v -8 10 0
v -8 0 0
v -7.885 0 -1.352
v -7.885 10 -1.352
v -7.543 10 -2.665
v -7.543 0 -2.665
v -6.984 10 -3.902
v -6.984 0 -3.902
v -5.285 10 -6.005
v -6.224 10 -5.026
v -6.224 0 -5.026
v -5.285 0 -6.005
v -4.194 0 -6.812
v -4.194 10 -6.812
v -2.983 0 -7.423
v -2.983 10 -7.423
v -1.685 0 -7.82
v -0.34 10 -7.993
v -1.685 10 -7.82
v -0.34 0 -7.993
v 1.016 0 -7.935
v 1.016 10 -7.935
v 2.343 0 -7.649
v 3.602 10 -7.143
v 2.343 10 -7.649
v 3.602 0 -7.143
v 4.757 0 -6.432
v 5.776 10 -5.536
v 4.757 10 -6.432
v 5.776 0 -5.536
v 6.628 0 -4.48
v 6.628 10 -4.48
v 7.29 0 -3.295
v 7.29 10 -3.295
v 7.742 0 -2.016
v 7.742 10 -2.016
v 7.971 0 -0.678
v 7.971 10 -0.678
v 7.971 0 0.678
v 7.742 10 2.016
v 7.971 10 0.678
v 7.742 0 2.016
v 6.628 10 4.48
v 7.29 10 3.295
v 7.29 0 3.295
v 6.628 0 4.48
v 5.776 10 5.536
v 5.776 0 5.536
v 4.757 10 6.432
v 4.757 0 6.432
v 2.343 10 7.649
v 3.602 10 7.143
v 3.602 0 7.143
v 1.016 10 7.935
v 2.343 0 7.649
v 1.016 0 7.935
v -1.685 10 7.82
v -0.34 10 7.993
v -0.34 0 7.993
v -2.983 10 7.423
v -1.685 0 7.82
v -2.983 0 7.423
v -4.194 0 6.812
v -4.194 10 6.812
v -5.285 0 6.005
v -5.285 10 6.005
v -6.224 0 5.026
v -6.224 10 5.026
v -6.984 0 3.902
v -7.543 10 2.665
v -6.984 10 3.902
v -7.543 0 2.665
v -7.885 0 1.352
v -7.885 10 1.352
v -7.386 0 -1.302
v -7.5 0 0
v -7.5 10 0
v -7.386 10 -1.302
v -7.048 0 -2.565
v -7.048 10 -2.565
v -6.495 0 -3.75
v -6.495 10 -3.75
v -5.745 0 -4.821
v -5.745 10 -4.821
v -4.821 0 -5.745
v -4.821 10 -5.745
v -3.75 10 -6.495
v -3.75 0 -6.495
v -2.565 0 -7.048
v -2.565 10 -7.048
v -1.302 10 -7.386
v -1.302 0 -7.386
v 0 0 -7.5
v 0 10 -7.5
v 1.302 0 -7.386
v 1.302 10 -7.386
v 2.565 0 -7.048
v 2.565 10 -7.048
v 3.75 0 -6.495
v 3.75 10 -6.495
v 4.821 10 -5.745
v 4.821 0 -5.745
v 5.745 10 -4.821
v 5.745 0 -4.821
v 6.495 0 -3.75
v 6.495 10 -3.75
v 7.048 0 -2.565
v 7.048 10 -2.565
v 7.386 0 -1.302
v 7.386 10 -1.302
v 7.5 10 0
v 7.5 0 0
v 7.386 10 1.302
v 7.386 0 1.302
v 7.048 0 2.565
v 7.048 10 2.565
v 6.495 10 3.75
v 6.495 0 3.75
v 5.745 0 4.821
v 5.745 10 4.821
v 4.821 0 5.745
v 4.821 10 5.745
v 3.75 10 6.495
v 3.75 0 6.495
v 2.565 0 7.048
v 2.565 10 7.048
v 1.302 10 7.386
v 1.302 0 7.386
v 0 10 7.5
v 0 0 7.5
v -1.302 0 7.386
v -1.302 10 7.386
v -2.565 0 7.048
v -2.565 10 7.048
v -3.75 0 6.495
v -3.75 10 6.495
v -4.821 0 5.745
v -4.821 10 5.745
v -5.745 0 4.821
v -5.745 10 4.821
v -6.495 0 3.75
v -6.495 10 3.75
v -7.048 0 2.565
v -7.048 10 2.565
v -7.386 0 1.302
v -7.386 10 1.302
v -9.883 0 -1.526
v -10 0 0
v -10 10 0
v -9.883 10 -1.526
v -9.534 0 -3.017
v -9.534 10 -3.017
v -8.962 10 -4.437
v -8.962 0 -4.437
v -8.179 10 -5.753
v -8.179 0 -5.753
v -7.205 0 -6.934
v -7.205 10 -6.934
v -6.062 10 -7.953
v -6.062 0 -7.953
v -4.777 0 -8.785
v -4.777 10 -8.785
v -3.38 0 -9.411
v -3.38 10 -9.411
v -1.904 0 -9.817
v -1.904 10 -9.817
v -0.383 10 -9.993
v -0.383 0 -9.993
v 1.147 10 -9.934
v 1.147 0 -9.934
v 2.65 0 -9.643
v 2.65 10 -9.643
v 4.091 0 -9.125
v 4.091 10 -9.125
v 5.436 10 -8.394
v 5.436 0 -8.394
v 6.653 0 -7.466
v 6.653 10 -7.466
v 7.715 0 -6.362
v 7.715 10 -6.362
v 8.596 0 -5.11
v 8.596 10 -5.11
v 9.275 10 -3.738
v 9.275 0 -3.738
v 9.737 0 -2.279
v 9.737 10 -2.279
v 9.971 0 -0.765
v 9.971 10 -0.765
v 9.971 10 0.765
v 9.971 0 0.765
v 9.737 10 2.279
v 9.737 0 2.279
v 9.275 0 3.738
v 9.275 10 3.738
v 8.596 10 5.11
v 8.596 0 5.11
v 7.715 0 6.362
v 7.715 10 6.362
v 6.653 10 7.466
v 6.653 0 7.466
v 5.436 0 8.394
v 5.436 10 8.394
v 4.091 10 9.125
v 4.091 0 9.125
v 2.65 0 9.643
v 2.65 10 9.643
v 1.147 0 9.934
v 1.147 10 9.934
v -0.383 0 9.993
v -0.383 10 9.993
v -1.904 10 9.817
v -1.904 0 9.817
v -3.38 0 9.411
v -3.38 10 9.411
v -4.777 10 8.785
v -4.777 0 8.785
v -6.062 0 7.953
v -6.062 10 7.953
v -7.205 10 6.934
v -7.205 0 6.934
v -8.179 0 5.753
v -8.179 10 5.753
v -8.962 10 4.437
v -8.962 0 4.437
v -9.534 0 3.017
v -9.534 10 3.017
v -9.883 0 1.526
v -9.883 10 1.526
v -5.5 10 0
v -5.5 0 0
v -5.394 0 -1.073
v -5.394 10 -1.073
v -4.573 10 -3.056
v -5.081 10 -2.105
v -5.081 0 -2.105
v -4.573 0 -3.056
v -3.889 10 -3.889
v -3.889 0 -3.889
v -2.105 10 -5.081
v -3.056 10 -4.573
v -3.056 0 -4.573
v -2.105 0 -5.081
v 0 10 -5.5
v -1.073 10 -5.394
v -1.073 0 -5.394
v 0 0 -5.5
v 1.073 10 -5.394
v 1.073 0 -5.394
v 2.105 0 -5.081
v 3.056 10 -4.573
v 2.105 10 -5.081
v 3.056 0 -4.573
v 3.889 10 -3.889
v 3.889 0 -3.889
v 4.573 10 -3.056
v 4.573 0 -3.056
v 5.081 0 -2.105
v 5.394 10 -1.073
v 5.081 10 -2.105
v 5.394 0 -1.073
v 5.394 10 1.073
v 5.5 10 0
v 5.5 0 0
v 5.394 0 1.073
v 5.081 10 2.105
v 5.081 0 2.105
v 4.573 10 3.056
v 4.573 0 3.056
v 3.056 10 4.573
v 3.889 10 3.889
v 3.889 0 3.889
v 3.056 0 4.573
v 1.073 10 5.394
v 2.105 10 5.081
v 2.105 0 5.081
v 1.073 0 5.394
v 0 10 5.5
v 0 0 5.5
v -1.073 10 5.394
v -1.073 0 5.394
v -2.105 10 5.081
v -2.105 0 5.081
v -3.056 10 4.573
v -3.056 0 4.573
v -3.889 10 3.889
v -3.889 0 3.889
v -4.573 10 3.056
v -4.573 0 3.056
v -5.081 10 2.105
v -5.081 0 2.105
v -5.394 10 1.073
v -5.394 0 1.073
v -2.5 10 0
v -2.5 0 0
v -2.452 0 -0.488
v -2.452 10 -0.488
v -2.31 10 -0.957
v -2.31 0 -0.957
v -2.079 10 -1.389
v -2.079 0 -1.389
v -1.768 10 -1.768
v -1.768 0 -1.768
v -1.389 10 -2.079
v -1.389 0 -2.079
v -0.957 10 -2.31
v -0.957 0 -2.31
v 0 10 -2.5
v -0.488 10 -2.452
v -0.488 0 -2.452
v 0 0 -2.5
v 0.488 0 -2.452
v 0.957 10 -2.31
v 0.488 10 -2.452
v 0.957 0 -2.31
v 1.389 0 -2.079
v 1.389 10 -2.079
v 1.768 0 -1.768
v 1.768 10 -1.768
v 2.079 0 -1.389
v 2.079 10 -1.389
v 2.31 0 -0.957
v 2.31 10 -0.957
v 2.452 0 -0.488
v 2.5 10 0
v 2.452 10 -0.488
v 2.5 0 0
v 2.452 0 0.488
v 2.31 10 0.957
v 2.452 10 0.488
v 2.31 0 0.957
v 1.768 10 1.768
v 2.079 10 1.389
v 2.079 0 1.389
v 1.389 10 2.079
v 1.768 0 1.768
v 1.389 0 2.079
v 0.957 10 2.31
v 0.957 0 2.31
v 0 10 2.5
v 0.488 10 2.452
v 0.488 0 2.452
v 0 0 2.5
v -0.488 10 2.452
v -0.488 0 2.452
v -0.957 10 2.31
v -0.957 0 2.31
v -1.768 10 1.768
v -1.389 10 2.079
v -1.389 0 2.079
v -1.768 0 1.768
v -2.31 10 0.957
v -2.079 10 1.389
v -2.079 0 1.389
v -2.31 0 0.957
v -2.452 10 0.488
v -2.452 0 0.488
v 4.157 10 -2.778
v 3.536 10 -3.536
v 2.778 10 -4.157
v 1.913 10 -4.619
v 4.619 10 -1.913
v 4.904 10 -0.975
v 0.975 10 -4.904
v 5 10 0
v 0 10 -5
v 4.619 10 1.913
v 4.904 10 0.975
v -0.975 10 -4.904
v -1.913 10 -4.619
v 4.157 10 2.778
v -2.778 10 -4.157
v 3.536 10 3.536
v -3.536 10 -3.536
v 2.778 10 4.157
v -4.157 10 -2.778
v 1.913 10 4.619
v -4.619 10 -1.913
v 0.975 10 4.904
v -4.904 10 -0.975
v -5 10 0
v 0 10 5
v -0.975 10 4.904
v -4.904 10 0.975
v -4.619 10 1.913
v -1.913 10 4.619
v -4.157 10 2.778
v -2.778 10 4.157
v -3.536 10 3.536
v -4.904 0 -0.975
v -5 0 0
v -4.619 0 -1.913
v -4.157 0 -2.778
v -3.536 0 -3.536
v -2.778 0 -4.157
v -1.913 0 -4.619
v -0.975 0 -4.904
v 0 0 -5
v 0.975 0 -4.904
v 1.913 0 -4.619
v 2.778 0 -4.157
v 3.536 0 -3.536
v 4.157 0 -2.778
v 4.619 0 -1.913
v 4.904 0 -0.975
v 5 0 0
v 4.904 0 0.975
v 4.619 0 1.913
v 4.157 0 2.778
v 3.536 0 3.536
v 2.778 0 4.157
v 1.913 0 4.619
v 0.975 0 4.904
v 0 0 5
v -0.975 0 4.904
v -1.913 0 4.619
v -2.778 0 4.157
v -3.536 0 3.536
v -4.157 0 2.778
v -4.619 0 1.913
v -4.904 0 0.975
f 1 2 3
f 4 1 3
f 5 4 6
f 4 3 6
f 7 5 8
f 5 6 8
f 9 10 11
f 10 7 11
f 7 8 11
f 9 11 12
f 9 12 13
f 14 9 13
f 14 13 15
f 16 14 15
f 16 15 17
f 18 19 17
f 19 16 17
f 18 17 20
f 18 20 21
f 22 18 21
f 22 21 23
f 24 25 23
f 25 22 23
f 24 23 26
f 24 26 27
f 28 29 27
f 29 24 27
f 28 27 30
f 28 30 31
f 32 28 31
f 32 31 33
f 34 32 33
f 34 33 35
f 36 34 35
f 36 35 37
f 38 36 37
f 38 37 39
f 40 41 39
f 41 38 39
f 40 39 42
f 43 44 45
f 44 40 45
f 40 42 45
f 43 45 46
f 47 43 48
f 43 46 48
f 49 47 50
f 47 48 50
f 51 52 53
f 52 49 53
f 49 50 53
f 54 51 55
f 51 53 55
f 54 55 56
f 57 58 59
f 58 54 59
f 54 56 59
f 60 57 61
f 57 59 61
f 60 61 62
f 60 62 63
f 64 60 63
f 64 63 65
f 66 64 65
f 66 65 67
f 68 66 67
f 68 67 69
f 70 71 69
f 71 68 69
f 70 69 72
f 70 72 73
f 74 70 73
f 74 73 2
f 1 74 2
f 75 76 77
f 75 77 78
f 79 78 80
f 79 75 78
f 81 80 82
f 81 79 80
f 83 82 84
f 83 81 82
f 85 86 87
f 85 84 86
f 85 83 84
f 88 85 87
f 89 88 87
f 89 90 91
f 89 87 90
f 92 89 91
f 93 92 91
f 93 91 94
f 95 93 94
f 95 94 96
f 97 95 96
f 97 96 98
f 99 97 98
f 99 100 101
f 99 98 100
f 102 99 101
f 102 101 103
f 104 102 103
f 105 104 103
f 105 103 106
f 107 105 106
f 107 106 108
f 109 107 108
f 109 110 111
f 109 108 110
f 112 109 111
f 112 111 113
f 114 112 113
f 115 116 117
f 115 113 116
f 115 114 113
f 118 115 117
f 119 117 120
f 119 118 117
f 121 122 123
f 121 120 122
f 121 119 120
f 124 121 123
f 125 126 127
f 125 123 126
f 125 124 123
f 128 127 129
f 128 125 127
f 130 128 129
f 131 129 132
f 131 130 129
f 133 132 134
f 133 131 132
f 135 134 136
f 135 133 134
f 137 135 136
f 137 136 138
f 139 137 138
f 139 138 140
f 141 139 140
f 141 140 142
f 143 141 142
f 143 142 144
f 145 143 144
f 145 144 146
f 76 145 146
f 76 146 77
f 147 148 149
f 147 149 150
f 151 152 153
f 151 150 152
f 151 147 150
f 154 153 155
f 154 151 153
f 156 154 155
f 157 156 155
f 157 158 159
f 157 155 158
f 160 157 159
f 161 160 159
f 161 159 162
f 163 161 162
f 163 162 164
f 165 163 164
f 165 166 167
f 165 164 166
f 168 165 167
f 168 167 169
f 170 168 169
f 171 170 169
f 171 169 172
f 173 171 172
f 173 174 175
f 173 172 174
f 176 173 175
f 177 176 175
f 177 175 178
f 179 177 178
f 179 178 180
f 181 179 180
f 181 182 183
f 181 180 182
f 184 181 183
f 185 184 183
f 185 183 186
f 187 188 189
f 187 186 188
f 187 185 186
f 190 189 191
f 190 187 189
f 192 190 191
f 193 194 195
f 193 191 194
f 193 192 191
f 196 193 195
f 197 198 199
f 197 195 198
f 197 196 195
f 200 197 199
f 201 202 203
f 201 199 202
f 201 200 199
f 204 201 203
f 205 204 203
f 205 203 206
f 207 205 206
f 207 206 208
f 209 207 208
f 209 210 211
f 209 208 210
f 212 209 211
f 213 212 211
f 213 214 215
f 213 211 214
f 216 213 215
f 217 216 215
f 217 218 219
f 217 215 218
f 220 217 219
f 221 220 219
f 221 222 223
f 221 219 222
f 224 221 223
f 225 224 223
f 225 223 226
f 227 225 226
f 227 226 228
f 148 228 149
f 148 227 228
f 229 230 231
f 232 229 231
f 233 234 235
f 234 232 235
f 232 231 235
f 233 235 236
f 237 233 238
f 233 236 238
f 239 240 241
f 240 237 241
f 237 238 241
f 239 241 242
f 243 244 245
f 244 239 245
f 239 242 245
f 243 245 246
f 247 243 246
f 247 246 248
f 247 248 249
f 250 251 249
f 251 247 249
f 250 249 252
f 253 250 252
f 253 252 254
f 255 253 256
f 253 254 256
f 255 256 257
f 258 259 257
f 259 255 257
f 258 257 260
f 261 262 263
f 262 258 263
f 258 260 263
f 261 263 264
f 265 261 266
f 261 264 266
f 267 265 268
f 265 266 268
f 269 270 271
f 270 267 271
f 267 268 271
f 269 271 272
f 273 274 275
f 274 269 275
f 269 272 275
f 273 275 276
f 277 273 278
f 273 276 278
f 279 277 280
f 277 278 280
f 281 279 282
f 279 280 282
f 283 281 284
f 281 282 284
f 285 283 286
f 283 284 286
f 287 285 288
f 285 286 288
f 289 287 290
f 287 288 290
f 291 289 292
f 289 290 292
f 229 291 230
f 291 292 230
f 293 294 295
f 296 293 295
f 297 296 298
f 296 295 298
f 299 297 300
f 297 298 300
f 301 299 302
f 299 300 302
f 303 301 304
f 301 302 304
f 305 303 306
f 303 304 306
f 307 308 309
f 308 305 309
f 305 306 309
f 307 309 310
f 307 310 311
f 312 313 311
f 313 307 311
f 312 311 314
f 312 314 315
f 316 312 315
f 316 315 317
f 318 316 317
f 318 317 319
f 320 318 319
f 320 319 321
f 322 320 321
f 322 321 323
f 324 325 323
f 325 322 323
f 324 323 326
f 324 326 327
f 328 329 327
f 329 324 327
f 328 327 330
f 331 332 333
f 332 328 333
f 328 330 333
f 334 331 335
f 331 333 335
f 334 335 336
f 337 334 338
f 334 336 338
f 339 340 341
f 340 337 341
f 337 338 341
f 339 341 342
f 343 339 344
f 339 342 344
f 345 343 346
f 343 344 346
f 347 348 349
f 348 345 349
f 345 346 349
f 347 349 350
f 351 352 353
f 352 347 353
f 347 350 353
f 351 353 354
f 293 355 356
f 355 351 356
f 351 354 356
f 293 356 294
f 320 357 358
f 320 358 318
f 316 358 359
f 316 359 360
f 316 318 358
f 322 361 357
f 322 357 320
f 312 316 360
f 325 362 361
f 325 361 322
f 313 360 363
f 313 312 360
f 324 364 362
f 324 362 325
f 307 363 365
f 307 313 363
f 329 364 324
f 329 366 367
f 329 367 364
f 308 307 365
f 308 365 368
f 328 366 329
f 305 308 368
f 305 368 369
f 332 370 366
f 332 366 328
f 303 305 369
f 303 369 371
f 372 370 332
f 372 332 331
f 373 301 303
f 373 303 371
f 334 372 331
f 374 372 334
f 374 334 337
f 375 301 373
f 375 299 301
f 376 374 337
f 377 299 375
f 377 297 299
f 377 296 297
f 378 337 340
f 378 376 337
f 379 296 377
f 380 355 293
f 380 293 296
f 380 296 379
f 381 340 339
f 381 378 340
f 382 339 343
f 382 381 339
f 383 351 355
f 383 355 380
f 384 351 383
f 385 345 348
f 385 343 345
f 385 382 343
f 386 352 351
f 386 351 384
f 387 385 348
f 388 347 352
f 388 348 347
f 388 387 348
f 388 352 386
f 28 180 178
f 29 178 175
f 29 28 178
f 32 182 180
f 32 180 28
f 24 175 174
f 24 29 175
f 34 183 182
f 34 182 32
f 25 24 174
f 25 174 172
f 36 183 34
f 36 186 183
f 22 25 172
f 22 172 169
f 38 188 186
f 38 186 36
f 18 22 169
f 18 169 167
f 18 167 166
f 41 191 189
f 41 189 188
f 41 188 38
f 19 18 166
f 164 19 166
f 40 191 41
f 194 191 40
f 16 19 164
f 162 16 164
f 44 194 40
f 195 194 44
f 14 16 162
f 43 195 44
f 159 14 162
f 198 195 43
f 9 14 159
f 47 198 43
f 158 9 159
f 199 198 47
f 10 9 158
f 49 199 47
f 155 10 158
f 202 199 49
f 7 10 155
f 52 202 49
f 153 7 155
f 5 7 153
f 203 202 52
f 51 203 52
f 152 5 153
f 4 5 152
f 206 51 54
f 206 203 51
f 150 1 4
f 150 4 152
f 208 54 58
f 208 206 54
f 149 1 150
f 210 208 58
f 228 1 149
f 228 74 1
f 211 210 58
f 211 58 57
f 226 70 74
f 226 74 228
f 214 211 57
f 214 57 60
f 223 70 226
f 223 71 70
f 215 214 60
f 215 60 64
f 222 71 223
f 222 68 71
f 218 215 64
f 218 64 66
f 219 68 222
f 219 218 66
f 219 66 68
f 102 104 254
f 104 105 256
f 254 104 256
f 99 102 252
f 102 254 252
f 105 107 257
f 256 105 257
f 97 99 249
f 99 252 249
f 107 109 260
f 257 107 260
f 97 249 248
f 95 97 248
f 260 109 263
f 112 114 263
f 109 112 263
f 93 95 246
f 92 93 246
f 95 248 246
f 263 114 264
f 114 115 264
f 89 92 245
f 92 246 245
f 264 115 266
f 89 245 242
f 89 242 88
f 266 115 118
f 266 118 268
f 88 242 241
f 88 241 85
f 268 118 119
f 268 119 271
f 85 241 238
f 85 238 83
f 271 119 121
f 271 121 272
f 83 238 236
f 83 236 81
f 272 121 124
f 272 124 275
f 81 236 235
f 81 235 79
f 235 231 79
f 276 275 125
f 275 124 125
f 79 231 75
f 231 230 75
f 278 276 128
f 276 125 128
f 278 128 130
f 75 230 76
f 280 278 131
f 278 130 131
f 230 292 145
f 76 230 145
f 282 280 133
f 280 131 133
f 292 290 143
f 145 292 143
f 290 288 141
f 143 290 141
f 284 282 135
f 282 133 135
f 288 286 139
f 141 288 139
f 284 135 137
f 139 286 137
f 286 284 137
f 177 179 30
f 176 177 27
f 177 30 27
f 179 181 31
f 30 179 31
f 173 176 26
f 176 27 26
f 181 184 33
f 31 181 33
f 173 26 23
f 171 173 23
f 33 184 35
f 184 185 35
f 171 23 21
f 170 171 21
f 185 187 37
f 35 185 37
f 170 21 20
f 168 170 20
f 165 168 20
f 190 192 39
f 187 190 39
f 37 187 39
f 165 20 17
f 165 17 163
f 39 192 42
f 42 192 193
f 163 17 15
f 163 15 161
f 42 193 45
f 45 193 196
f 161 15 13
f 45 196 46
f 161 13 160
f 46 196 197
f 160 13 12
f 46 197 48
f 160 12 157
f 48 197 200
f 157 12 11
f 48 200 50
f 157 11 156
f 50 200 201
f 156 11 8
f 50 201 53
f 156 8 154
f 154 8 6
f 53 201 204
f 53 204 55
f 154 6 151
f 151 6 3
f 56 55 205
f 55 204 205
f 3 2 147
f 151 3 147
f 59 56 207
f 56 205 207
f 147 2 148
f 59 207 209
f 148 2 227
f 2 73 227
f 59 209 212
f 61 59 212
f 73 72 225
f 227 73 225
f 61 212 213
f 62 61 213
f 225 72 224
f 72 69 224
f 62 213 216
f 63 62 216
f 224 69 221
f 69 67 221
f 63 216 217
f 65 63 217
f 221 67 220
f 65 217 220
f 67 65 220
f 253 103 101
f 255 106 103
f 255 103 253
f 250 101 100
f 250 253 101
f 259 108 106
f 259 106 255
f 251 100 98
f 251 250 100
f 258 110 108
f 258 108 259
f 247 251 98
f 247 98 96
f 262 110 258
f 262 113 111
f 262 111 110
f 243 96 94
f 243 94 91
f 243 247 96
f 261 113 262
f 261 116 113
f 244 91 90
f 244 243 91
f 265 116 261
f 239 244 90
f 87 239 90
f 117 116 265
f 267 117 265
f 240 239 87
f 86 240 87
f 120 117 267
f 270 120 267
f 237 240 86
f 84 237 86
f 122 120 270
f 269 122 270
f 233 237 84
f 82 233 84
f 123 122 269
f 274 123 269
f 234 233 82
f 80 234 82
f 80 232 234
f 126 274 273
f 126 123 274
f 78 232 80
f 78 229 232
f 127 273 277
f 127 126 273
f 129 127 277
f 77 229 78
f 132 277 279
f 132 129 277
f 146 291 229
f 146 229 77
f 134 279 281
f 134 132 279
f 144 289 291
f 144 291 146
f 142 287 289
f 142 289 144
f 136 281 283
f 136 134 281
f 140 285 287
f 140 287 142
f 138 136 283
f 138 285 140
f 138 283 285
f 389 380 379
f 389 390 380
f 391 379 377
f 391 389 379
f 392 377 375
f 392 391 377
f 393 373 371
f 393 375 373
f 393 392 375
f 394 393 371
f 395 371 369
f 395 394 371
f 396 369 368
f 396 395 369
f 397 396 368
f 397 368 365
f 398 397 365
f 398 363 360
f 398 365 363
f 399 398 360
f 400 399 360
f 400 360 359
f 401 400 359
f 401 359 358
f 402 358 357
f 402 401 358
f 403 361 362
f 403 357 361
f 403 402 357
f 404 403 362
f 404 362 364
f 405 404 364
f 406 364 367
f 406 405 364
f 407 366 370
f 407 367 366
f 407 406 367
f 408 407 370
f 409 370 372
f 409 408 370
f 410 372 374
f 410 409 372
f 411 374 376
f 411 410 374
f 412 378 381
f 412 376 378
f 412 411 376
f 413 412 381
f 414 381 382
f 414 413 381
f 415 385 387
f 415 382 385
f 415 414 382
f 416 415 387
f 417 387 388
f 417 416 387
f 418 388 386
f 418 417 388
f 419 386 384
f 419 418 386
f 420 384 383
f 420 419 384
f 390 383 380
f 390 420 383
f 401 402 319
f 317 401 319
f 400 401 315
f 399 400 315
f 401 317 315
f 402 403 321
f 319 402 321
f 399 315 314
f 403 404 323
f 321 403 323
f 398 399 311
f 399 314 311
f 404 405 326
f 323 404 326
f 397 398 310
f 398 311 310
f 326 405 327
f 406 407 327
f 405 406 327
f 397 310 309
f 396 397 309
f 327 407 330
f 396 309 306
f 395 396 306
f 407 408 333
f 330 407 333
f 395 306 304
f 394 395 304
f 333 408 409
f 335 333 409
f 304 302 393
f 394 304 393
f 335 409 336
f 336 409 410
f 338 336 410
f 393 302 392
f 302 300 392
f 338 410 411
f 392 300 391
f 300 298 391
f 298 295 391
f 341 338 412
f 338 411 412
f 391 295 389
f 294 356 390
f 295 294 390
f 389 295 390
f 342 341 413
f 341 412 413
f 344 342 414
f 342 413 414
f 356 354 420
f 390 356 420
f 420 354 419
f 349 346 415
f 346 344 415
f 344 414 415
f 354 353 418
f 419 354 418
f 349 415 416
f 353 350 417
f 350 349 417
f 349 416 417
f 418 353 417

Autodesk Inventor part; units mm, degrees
ref_plane "YZ Plane" through (0, 0, 0) normal (1, 0, 0) x (0, 1, 0)
ref_plane "XZ Plane" through (0, 0, 0) normal (0, 1, 0) x (-1, 0, 0)
ref_plane "XY Plane" through (0, 0, 0) normal (0, 0, 1) x (1, 0, 0)
sketch "Sketch1" plane through (0, 0, 0) normal (0, 1, 0) x (-1, 0, 0)
  circle A0 centre (0, 0) radius 7.5
  circle A1 centre (0, 0) radius 8
  circle A2 centre (0, 0) radius 5
  circle A3 centre (0, 0) radius 10
  circle A4 centre (0, 0) radius 5.5
  circle A5 centre (0, 0) radius 2.5
  dimension "d0" = 15
  dimension "d1" = 16
  dimension "d2" = 10
  dimension "d3" = 20
  dimension "d6" = 11
  dimension "d7" = 5
extrude "Extrusion1" add sketch "Sketch1" along normal blind 10
